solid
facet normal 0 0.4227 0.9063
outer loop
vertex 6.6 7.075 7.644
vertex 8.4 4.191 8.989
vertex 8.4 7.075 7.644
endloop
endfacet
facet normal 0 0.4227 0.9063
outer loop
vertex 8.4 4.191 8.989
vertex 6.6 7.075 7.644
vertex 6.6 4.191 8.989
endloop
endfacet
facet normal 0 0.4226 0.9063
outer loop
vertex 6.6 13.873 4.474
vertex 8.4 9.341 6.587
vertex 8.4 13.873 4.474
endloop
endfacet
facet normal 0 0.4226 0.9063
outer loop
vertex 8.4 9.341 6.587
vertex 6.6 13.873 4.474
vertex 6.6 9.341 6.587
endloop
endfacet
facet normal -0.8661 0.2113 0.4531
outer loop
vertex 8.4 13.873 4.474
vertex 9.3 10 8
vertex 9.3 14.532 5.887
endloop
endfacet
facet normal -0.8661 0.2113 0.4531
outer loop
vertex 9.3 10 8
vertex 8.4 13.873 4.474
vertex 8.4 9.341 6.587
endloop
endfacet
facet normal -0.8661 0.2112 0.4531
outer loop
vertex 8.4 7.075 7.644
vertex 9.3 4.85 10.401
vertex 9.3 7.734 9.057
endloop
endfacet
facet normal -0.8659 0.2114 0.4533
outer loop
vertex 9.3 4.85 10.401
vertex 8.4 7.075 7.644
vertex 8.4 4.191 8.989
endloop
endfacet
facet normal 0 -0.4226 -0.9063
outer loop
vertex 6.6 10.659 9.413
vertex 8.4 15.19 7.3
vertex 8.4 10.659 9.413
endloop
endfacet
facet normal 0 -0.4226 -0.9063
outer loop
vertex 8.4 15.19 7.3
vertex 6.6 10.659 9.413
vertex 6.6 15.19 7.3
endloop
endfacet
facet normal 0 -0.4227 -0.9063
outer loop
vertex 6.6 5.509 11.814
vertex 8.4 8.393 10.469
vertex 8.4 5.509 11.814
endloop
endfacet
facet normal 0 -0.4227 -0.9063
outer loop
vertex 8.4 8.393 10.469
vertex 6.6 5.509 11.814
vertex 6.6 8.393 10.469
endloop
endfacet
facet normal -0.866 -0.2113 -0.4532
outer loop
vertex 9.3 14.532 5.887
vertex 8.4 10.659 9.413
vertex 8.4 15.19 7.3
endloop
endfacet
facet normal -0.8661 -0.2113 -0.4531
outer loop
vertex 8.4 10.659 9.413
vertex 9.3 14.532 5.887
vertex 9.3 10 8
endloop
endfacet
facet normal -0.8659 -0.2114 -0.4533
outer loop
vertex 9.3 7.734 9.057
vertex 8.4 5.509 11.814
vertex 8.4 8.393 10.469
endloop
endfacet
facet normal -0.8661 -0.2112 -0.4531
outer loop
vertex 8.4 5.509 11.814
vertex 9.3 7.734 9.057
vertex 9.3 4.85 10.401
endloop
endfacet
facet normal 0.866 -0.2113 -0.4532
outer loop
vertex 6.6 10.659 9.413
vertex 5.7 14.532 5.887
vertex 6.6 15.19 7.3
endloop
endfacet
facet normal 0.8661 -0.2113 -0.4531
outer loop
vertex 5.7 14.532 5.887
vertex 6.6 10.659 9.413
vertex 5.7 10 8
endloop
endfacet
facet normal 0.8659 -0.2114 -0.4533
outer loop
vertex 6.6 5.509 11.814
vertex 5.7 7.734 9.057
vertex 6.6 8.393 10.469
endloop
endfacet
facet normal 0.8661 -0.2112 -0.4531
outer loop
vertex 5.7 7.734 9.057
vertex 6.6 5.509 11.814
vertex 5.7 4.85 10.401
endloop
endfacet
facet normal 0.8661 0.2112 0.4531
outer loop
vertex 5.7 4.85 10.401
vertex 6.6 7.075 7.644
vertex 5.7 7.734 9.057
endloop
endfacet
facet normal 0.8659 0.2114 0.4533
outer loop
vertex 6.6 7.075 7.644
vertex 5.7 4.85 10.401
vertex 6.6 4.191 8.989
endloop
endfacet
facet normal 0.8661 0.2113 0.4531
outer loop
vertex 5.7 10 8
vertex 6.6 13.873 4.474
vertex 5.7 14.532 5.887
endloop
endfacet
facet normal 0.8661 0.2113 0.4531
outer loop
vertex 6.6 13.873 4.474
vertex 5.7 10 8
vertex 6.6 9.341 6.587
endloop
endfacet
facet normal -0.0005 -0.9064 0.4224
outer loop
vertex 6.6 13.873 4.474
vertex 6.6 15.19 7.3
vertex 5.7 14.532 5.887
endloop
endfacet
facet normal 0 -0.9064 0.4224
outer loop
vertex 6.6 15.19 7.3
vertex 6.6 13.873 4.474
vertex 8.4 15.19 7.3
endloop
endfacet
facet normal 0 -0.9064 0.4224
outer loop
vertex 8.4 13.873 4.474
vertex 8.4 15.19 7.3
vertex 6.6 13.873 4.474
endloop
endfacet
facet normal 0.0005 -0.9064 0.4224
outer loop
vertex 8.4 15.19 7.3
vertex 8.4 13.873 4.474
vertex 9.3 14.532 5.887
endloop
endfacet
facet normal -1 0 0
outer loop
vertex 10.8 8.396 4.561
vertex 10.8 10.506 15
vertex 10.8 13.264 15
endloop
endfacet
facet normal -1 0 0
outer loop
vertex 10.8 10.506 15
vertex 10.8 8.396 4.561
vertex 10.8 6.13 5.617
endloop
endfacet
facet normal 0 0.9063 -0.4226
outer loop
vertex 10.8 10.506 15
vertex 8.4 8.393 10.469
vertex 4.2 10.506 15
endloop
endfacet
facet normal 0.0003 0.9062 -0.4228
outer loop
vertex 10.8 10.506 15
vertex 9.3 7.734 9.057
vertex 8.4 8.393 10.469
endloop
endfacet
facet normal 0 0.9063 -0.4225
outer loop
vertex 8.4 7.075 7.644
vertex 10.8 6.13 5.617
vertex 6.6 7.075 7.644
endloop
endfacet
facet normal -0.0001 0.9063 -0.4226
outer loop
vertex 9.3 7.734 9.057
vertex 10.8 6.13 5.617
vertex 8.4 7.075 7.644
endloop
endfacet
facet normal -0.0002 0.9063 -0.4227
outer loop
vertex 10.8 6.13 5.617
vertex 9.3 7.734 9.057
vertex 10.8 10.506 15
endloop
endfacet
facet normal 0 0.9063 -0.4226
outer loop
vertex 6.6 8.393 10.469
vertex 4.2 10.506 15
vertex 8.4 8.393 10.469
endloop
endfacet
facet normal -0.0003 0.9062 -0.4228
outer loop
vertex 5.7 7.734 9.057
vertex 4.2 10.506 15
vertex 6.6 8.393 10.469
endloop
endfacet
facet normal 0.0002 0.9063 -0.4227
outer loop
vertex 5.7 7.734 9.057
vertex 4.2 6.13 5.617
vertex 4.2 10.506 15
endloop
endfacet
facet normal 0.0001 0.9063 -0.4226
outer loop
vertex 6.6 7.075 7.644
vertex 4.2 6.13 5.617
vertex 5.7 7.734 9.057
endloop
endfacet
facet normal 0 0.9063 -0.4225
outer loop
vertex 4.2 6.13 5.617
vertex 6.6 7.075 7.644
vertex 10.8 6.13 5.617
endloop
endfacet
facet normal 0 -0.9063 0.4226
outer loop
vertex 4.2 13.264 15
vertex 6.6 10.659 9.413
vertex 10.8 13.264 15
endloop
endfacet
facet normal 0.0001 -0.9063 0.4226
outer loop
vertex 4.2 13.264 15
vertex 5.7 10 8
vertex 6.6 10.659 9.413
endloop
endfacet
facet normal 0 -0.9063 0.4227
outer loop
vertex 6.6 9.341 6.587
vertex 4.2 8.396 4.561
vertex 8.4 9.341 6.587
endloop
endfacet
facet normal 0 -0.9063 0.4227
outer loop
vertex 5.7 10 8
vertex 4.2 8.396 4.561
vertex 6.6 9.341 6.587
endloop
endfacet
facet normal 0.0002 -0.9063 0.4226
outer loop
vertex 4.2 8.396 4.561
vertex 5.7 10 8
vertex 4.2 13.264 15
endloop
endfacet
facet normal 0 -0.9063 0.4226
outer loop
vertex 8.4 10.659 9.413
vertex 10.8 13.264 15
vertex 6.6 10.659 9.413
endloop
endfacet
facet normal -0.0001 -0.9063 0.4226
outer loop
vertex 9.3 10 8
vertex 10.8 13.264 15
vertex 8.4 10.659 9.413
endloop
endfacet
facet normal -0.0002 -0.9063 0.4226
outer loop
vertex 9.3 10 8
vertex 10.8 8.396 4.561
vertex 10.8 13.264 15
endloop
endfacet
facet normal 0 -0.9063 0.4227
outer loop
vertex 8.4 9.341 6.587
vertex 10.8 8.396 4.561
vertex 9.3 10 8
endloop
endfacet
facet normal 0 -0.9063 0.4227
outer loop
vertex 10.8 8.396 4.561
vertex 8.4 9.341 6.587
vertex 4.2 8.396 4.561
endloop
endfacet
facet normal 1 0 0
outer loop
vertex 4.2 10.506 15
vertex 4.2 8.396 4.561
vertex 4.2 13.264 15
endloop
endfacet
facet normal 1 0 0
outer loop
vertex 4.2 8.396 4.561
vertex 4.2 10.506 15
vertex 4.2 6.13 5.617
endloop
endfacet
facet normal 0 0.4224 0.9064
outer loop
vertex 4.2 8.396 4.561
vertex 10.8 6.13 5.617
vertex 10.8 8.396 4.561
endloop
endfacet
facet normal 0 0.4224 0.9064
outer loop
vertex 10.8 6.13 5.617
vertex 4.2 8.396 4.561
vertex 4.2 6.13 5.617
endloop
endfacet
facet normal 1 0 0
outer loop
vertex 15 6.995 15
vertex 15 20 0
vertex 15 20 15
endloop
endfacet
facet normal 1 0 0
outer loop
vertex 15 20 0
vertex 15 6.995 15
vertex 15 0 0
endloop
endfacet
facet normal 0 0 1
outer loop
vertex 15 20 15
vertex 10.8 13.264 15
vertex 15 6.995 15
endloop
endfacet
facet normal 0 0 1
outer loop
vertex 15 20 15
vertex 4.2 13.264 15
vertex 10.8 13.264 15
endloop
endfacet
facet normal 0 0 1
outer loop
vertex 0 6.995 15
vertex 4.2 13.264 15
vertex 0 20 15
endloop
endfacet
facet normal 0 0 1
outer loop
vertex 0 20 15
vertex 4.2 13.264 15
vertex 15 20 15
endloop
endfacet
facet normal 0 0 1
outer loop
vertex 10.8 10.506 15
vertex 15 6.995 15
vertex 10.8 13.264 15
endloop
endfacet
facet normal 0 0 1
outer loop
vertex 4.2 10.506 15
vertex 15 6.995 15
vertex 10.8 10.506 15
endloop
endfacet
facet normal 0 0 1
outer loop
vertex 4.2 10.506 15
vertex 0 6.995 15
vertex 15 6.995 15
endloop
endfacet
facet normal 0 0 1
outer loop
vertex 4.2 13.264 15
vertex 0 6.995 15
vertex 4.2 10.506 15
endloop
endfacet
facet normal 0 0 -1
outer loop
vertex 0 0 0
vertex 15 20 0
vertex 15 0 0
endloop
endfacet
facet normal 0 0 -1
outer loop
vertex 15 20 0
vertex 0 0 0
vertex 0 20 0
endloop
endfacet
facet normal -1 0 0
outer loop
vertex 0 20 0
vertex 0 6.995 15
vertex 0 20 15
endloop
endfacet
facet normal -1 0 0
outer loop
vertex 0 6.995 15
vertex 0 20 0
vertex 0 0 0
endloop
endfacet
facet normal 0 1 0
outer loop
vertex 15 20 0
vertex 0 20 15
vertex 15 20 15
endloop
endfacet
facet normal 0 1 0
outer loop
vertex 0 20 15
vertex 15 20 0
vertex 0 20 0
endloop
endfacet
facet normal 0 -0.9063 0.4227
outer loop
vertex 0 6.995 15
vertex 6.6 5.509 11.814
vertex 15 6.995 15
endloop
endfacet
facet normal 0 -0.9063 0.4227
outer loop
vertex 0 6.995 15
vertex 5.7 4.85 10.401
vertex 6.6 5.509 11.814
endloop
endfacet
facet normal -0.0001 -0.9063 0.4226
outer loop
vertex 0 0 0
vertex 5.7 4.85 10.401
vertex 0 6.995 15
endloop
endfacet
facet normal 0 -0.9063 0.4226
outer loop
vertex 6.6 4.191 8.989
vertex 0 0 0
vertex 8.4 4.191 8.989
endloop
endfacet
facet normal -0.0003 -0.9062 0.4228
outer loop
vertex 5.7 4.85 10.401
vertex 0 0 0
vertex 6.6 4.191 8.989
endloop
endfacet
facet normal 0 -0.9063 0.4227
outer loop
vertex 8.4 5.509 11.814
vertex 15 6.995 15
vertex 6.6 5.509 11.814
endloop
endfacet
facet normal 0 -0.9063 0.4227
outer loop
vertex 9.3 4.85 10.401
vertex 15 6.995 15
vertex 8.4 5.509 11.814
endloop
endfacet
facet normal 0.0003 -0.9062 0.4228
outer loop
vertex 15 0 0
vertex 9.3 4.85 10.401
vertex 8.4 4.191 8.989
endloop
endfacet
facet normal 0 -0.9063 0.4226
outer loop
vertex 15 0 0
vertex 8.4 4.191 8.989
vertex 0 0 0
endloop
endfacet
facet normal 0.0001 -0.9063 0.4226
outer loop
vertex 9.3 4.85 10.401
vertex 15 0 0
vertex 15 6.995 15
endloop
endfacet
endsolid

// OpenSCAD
module Nut(width,thickness){
    translate([-width/2,-width/2,0]) cube([width,width,thickness]);
}

module NutSideAccess(nut_width,y,nut_thickness){
    // to allow depth for the hex nut in the slot, we multiply the width of the nut by the ratio here. Half of this is used to account for the depth in the hole. This is needed because hex nuts will sit on a point in the slot with two flat faces against the sides
    ratio = 1.15;
    depth = nut_width * ratio / 2;
    translate([-nut_width/2,-depth,0]) cube([nut_width,y+depth,nut_thickness]);
}

module Bolt(shaft_dia,head_dia,length,head_depth){
    cylinder(d=shaft_dia,h=length);
    translate([0,0,length]) cylinder(d=head_dia,h=head_depth);
}

module angle_bolt_boss(face_angle,bolt_shaft_dia,bolt_head_dia,bolt_length,head_depth,nut_width,nut_thickness){
    difference(){
        cube([15,20,15]);
        rotate([face_angle,0,0]) cube([30,30,30]);
        translate([7.5,10,8]) rotate([face_angle,0,0]) union(){
            Nut(nut_width,nut_thickness);
            translate([0,0,-5]) Bolt(bolt_shaft_dia,bolt_head_dia,bolt_length,head_depth);
            NutSideAccess(nut_width,20,nut_thickness);
        }
    }
}

angle_bolt_boss(face_angle=65,bolt_shaft_dia=3.6,bolt_head_dia=6.5,bolt_length=20,head_depth=3.5,nut_width=6.6,nut_thickness=2.5);
